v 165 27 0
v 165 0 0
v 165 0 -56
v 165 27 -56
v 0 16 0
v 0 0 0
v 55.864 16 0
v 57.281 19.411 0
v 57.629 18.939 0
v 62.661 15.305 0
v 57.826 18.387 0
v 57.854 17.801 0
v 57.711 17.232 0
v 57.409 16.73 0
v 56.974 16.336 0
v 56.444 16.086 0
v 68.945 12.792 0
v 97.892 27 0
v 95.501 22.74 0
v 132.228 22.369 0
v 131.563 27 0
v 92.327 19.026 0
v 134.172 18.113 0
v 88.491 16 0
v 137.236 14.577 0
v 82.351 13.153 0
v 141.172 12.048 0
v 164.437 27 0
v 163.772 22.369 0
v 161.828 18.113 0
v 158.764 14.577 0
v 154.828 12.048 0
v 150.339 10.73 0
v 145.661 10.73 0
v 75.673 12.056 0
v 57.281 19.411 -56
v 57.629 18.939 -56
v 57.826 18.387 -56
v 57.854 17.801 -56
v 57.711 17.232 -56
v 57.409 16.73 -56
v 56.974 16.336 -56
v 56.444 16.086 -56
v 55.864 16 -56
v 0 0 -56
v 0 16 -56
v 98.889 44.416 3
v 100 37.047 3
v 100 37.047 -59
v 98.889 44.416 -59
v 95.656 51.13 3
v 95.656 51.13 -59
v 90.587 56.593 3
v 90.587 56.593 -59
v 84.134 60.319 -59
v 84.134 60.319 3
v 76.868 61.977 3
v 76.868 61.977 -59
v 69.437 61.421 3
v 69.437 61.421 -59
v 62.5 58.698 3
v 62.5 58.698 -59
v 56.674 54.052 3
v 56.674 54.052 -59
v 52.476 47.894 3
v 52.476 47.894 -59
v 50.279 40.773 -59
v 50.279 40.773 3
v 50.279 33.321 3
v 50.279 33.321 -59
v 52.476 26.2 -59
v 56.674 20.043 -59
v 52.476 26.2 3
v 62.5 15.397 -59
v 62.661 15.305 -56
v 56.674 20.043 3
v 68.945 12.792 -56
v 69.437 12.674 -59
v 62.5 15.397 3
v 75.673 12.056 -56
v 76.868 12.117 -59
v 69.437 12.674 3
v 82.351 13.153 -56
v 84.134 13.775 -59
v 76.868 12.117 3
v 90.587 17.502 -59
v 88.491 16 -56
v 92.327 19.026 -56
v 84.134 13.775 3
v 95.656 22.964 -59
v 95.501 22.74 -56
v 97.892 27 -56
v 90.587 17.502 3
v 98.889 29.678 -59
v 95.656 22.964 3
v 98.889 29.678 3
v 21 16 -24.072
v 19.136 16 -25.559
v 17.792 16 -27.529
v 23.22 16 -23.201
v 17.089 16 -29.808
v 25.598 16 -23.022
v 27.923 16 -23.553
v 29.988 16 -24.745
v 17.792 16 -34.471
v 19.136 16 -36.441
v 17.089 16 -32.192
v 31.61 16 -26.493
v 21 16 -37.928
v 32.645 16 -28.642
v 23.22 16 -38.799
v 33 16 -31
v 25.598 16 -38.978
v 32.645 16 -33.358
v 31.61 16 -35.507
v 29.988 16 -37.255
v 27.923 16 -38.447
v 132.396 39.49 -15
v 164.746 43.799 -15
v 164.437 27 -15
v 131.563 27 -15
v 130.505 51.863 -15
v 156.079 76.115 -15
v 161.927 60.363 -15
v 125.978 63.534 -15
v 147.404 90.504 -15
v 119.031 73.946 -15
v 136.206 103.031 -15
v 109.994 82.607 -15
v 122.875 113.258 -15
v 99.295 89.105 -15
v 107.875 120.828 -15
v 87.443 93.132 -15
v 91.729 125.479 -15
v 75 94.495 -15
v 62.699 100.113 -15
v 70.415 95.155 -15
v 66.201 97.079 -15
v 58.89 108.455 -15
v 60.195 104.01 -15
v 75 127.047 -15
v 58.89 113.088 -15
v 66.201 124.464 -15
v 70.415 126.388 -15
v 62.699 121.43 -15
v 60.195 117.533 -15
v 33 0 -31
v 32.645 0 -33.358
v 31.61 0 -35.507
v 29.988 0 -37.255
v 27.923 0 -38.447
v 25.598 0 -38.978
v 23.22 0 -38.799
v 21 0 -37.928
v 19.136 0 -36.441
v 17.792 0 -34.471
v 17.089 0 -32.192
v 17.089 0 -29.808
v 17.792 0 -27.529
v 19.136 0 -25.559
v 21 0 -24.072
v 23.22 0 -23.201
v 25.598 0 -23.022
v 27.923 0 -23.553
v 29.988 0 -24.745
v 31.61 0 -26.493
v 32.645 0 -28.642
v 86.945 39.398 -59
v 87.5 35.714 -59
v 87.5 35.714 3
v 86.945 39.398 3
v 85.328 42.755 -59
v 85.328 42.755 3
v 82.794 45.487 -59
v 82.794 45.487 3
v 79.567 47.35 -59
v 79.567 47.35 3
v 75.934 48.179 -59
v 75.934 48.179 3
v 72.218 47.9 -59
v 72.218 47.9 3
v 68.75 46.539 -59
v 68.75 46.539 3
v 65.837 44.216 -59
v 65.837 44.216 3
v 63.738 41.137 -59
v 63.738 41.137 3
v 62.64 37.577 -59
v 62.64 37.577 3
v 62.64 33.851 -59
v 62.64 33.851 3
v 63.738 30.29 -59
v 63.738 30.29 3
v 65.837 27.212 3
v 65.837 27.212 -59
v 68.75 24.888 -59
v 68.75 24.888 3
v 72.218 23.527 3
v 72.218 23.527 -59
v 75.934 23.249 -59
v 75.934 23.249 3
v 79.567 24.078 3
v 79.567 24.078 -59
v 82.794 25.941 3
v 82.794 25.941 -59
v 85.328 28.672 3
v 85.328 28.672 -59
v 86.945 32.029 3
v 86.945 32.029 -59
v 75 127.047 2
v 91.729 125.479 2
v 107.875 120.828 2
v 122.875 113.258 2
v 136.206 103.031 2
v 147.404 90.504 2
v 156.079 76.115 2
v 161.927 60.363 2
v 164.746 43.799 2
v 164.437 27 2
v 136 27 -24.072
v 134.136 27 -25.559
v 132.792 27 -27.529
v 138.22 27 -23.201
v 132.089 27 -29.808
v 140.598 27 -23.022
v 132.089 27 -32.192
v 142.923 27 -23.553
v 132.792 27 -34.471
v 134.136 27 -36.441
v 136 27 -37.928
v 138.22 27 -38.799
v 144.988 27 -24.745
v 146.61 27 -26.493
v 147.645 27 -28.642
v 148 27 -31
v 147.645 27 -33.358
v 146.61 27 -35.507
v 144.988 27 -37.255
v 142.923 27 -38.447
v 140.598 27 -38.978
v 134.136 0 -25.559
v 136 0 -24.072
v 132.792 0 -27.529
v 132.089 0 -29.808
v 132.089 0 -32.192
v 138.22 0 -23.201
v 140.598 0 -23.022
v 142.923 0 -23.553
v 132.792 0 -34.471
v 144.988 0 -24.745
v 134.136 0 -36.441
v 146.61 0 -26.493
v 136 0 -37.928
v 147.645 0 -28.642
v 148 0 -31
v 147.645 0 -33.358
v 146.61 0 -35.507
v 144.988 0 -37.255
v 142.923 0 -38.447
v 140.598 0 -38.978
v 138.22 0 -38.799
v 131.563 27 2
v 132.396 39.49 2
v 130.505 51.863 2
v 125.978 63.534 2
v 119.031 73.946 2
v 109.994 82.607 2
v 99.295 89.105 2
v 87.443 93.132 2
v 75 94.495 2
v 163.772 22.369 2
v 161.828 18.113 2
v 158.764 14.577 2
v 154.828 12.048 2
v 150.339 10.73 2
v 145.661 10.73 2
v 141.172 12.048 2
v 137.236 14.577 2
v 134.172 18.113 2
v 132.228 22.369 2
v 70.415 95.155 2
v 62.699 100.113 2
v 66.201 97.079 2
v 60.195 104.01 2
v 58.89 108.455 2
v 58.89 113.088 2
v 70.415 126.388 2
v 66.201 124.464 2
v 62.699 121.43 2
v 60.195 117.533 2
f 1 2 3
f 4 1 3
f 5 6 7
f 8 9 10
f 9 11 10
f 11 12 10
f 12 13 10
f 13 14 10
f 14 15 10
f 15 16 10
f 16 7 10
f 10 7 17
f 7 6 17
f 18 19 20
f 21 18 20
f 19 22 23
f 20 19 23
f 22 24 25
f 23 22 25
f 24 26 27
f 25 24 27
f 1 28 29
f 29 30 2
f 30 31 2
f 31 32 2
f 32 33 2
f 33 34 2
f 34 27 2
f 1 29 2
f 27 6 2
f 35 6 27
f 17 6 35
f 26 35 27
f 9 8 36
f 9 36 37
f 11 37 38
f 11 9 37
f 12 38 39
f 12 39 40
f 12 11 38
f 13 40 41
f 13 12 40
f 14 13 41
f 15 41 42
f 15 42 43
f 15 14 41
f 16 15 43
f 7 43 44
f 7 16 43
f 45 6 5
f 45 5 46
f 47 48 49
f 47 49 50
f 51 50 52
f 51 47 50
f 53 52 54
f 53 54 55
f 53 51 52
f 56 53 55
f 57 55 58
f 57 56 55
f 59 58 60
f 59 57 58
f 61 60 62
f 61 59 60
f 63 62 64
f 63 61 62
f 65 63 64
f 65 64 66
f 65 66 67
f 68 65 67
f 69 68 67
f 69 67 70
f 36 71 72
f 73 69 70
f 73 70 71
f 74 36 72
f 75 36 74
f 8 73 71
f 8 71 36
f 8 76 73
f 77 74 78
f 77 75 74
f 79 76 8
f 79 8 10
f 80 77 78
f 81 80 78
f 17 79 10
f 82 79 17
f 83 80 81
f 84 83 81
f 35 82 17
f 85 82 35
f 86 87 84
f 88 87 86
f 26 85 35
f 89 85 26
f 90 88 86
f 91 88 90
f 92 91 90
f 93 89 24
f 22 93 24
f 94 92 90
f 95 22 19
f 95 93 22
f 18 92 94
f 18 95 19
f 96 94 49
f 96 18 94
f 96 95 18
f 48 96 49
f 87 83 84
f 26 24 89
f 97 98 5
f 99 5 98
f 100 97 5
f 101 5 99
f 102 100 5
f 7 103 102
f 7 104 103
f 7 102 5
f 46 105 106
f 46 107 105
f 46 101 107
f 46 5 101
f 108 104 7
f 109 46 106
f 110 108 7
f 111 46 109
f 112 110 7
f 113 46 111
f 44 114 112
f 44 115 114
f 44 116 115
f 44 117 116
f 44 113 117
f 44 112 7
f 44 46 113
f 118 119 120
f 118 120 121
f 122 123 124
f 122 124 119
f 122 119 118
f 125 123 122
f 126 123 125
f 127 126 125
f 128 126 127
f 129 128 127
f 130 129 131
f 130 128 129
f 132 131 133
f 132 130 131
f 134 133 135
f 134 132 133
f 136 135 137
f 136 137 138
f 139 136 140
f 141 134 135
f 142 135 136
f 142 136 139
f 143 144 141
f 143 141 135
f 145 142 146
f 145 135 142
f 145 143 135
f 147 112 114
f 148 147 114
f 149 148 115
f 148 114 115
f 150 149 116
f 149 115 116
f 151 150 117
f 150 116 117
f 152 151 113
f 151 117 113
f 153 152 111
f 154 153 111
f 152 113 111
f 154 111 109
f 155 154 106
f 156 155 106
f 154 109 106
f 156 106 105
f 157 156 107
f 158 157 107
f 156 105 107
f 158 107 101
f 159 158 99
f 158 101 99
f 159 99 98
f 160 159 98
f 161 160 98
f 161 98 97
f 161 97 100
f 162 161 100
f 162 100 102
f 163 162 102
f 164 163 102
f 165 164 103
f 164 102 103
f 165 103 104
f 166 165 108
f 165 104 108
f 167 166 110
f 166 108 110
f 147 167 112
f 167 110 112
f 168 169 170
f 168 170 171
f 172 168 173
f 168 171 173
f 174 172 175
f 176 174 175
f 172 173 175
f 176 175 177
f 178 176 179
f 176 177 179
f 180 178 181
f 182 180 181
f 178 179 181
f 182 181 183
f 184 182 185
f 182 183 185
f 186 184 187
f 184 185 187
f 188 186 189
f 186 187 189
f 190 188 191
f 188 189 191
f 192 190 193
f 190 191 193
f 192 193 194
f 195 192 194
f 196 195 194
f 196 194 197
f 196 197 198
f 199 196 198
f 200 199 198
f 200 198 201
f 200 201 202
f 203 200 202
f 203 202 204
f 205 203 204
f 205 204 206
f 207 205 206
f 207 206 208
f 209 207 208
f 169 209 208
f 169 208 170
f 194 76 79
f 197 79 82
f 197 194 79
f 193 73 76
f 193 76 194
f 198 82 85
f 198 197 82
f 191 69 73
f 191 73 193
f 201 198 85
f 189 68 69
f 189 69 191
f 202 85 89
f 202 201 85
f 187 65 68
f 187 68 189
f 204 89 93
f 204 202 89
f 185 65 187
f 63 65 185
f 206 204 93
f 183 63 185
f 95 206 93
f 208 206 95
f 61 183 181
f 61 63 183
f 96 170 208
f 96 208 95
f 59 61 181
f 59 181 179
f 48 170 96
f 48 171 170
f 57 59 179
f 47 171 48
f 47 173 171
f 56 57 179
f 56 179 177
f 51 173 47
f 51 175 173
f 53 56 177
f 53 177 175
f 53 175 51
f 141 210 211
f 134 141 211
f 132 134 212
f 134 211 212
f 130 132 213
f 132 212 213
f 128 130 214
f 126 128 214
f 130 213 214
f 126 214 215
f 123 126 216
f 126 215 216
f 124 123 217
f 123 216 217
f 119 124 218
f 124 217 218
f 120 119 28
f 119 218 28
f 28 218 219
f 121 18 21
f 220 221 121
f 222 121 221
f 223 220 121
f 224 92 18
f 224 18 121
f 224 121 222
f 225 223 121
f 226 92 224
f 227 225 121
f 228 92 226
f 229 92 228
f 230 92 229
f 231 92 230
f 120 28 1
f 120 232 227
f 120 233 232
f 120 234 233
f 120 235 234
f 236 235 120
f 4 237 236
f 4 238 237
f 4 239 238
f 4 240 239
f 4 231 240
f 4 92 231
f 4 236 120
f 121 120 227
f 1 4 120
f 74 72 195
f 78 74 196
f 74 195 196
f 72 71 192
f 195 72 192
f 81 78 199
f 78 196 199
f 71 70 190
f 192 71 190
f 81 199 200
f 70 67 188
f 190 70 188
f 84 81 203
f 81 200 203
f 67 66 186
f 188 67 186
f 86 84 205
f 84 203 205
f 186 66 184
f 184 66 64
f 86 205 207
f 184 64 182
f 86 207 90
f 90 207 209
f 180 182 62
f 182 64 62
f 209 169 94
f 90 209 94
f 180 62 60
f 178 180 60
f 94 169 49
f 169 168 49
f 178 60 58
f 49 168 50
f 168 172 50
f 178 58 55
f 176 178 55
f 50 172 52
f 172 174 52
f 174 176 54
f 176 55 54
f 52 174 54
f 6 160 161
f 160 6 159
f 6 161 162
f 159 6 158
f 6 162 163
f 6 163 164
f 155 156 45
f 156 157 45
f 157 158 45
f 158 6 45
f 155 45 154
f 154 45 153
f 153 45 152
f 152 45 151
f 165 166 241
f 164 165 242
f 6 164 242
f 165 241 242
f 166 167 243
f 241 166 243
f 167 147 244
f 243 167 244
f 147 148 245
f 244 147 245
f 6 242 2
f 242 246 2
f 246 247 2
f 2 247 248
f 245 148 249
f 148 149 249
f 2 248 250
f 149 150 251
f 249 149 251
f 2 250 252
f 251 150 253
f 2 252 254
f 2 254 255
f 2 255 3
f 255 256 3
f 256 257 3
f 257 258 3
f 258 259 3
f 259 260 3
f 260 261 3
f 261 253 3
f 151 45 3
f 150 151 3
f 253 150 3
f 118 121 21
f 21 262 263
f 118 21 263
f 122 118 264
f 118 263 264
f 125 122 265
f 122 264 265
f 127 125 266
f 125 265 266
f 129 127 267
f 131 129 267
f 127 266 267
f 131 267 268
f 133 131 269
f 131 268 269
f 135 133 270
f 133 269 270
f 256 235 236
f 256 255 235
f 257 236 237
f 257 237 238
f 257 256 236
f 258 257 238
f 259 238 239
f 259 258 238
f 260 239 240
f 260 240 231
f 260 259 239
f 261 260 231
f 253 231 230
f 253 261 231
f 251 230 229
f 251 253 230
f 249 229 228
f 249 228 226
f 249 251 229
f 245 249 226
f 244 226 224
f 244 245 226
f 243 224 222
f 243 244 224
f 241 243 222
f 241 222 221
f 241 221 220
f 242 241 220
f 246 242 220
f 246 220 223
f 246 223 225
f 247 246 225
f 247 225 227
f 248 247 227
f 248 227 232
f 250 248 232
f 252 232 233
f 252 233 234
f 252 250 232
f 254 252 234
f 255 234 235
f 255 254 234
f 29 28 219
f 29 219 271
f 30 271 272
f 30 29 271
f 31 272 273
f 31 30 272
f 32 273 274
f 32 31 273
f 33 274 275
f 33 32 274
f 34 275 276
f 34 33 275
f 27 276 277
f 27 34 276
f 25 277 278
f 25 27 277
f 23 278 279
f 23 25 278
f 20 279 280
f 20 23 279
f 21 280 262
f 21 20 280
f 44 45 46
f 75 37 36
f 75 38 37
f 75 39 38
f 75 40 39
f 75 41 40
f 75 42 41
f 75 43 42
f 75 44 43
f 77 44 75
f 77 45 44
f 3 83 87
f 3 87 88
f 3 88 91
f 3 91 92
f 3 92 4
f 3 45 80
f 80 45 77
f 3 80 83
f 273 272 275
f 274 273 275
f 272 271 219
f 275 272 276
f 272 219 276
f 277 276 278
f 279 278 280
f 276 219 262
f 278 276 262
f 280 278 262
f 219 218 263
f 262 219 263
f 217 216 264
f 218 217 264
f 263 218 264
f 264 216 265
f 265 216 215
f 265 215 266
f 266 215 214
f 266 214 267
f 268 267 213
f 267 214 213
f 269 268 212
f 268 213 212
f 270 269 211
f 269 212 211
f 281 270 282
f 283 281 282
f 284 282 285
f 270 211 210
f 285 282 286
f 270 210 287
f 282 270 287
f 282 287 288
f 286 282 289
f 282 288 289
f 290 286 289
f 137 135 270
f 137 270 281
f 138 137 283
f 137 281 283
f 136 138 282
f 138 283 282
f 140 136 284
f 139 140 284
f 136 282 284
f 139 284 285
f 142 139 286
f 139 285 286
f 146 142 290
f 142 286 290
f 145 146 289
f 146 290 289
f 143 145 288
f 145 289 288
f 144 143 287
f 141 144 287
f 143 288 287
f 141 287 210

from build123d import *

# Parameters (mm, degrees)
SKETCH1_W                = 165
SKETCH1_H                = 56
BOSS_EXTRUDE1_DEPTH      = 16
SKETCH2_R                = 8
CUT_EXTRUDE1_DEPTH       = 16
SKETCH3_R                = 25
BOSS_EXTRUDE2_DEPTH      = 3
BOSS_EXTRUDE2_DEPTH_BACK = 59
FILLET1_R                = 2
SKETCH4_R                = 12.5
CUT_EXTRUDE2_DEPTH       = 63
SKETCH5_W                = 76.508877986
SKETCH5_H                = 56
SKETCH5_R                = 8
BOSS_EXTRUDE3_DEPTH      = 11
BOSS_EXTRUDE5_DEPTH      = 2
BOSS_EXTRUDE5_DEPTH_BACK = 15


with BuildPart() as part:
    # Sketch1 → Boss-Extrude1 (new body)
    with BuildSketch(Plane(origin=(0, 0, 0), x_dir=(1, 0, 0), z_dir=(0, 1, 0))):
        with Locations((82.5, 28)):
            Rectangle(SKETCH1_W, SKETCH1_H)
    extrude(amount=BOSS_EXTRUDE1_DEPTH)

    # Sketch2 → Cut-Extrude1 (cut)
    with BuildSketch(Plane(origin=(0, 16, 0), x_dir=(1, 0, 0), z_dir=(0, 1, 0))):
        with Locations((25, 31)):
            Circle(SKETCH2_R)
        with Locations((140, 31)):
            Circle(SKETCH2_R)
    extrude(amount=-CUT_EXTRUDE1_DEPTH, mode=Mode.SUBTRACT)

    # Sketch3 → Boss-Extrude2 (add, two sides)
    with BuildSketch(Plane.XY) as boss_extrude2_sk:
        with Locations((75, 37.047318756)):
            Circle(SKETCH3_R)
    extrude(amount=BOSS_EXTRUDE2_DEPTH)
    extrude(boss_extrude2_sk.sketch, amount=-BOSS_EXTRUDE2_DEPTH_BACK)

    # Fillet1
    fillet1_edges = [part.edges().sort_by_distance(p)[0] for p in [
        (61.508877986, 16, -28),
    ]]
    fillet(fillet1_edges, radius=FILLET1_R)

    # Sketch4 → Cut-Extrude2 (cut, through all)
    with BuildSketch(Plane.XY.offset(3)):
        with Locations((75, 35.713660164)):
            Circle(SKETCH4_R)
    extrude(amount=-CUT_EXTRUDE2_DEPTH, mode=Mode.SUBTRACT)

    # Sketch5 → Boss-Extrude3 (add)
    with BuildSketch(Plane(origin=(0, 16, 0), x_dir=(1, 0, 0), z_dir=(0, 1, 0))):
        with Locations((126.745561007, 28)):
            Rectangle(SKETCH5_W, SKETCH5_H)
        with Locations((140, 31)):
            Circle(SKETCH5_R, mode=Mode.SUBTRACT)
    extrude(amount=BOSS_EXTRUDE3_DEPTH)

    # Sketch8 → Boss-Extrude5 (add, two sides)
    with BuildSketch(Plane.XY) as boss_extrude5_sk:
        with BuildLine():
            ThreePointArc((75, 127.047318756), (142.097908641, 97.029571598), (164.437416028, 27))
            ThreePointArc((164.437416028, 27), (148, 10.562583972), (131.562583972, 27))
            ThreePointArc((131.562583972, 27), (119.031085874, 73.946343086), (75, 94.495334559))
            ThreePointArc((75, 94.495334559), (58.724007902, 110.771326658), (75, 127.047318756))
        make_face()
    extrude(amount=BOSS_EXTRUDE5_DEPTH)
    extrude(boss_extrude5_sk.sketch, amount=-BOSS_EXTRUDE5_DEPTH_BACK)


solid = part.part
